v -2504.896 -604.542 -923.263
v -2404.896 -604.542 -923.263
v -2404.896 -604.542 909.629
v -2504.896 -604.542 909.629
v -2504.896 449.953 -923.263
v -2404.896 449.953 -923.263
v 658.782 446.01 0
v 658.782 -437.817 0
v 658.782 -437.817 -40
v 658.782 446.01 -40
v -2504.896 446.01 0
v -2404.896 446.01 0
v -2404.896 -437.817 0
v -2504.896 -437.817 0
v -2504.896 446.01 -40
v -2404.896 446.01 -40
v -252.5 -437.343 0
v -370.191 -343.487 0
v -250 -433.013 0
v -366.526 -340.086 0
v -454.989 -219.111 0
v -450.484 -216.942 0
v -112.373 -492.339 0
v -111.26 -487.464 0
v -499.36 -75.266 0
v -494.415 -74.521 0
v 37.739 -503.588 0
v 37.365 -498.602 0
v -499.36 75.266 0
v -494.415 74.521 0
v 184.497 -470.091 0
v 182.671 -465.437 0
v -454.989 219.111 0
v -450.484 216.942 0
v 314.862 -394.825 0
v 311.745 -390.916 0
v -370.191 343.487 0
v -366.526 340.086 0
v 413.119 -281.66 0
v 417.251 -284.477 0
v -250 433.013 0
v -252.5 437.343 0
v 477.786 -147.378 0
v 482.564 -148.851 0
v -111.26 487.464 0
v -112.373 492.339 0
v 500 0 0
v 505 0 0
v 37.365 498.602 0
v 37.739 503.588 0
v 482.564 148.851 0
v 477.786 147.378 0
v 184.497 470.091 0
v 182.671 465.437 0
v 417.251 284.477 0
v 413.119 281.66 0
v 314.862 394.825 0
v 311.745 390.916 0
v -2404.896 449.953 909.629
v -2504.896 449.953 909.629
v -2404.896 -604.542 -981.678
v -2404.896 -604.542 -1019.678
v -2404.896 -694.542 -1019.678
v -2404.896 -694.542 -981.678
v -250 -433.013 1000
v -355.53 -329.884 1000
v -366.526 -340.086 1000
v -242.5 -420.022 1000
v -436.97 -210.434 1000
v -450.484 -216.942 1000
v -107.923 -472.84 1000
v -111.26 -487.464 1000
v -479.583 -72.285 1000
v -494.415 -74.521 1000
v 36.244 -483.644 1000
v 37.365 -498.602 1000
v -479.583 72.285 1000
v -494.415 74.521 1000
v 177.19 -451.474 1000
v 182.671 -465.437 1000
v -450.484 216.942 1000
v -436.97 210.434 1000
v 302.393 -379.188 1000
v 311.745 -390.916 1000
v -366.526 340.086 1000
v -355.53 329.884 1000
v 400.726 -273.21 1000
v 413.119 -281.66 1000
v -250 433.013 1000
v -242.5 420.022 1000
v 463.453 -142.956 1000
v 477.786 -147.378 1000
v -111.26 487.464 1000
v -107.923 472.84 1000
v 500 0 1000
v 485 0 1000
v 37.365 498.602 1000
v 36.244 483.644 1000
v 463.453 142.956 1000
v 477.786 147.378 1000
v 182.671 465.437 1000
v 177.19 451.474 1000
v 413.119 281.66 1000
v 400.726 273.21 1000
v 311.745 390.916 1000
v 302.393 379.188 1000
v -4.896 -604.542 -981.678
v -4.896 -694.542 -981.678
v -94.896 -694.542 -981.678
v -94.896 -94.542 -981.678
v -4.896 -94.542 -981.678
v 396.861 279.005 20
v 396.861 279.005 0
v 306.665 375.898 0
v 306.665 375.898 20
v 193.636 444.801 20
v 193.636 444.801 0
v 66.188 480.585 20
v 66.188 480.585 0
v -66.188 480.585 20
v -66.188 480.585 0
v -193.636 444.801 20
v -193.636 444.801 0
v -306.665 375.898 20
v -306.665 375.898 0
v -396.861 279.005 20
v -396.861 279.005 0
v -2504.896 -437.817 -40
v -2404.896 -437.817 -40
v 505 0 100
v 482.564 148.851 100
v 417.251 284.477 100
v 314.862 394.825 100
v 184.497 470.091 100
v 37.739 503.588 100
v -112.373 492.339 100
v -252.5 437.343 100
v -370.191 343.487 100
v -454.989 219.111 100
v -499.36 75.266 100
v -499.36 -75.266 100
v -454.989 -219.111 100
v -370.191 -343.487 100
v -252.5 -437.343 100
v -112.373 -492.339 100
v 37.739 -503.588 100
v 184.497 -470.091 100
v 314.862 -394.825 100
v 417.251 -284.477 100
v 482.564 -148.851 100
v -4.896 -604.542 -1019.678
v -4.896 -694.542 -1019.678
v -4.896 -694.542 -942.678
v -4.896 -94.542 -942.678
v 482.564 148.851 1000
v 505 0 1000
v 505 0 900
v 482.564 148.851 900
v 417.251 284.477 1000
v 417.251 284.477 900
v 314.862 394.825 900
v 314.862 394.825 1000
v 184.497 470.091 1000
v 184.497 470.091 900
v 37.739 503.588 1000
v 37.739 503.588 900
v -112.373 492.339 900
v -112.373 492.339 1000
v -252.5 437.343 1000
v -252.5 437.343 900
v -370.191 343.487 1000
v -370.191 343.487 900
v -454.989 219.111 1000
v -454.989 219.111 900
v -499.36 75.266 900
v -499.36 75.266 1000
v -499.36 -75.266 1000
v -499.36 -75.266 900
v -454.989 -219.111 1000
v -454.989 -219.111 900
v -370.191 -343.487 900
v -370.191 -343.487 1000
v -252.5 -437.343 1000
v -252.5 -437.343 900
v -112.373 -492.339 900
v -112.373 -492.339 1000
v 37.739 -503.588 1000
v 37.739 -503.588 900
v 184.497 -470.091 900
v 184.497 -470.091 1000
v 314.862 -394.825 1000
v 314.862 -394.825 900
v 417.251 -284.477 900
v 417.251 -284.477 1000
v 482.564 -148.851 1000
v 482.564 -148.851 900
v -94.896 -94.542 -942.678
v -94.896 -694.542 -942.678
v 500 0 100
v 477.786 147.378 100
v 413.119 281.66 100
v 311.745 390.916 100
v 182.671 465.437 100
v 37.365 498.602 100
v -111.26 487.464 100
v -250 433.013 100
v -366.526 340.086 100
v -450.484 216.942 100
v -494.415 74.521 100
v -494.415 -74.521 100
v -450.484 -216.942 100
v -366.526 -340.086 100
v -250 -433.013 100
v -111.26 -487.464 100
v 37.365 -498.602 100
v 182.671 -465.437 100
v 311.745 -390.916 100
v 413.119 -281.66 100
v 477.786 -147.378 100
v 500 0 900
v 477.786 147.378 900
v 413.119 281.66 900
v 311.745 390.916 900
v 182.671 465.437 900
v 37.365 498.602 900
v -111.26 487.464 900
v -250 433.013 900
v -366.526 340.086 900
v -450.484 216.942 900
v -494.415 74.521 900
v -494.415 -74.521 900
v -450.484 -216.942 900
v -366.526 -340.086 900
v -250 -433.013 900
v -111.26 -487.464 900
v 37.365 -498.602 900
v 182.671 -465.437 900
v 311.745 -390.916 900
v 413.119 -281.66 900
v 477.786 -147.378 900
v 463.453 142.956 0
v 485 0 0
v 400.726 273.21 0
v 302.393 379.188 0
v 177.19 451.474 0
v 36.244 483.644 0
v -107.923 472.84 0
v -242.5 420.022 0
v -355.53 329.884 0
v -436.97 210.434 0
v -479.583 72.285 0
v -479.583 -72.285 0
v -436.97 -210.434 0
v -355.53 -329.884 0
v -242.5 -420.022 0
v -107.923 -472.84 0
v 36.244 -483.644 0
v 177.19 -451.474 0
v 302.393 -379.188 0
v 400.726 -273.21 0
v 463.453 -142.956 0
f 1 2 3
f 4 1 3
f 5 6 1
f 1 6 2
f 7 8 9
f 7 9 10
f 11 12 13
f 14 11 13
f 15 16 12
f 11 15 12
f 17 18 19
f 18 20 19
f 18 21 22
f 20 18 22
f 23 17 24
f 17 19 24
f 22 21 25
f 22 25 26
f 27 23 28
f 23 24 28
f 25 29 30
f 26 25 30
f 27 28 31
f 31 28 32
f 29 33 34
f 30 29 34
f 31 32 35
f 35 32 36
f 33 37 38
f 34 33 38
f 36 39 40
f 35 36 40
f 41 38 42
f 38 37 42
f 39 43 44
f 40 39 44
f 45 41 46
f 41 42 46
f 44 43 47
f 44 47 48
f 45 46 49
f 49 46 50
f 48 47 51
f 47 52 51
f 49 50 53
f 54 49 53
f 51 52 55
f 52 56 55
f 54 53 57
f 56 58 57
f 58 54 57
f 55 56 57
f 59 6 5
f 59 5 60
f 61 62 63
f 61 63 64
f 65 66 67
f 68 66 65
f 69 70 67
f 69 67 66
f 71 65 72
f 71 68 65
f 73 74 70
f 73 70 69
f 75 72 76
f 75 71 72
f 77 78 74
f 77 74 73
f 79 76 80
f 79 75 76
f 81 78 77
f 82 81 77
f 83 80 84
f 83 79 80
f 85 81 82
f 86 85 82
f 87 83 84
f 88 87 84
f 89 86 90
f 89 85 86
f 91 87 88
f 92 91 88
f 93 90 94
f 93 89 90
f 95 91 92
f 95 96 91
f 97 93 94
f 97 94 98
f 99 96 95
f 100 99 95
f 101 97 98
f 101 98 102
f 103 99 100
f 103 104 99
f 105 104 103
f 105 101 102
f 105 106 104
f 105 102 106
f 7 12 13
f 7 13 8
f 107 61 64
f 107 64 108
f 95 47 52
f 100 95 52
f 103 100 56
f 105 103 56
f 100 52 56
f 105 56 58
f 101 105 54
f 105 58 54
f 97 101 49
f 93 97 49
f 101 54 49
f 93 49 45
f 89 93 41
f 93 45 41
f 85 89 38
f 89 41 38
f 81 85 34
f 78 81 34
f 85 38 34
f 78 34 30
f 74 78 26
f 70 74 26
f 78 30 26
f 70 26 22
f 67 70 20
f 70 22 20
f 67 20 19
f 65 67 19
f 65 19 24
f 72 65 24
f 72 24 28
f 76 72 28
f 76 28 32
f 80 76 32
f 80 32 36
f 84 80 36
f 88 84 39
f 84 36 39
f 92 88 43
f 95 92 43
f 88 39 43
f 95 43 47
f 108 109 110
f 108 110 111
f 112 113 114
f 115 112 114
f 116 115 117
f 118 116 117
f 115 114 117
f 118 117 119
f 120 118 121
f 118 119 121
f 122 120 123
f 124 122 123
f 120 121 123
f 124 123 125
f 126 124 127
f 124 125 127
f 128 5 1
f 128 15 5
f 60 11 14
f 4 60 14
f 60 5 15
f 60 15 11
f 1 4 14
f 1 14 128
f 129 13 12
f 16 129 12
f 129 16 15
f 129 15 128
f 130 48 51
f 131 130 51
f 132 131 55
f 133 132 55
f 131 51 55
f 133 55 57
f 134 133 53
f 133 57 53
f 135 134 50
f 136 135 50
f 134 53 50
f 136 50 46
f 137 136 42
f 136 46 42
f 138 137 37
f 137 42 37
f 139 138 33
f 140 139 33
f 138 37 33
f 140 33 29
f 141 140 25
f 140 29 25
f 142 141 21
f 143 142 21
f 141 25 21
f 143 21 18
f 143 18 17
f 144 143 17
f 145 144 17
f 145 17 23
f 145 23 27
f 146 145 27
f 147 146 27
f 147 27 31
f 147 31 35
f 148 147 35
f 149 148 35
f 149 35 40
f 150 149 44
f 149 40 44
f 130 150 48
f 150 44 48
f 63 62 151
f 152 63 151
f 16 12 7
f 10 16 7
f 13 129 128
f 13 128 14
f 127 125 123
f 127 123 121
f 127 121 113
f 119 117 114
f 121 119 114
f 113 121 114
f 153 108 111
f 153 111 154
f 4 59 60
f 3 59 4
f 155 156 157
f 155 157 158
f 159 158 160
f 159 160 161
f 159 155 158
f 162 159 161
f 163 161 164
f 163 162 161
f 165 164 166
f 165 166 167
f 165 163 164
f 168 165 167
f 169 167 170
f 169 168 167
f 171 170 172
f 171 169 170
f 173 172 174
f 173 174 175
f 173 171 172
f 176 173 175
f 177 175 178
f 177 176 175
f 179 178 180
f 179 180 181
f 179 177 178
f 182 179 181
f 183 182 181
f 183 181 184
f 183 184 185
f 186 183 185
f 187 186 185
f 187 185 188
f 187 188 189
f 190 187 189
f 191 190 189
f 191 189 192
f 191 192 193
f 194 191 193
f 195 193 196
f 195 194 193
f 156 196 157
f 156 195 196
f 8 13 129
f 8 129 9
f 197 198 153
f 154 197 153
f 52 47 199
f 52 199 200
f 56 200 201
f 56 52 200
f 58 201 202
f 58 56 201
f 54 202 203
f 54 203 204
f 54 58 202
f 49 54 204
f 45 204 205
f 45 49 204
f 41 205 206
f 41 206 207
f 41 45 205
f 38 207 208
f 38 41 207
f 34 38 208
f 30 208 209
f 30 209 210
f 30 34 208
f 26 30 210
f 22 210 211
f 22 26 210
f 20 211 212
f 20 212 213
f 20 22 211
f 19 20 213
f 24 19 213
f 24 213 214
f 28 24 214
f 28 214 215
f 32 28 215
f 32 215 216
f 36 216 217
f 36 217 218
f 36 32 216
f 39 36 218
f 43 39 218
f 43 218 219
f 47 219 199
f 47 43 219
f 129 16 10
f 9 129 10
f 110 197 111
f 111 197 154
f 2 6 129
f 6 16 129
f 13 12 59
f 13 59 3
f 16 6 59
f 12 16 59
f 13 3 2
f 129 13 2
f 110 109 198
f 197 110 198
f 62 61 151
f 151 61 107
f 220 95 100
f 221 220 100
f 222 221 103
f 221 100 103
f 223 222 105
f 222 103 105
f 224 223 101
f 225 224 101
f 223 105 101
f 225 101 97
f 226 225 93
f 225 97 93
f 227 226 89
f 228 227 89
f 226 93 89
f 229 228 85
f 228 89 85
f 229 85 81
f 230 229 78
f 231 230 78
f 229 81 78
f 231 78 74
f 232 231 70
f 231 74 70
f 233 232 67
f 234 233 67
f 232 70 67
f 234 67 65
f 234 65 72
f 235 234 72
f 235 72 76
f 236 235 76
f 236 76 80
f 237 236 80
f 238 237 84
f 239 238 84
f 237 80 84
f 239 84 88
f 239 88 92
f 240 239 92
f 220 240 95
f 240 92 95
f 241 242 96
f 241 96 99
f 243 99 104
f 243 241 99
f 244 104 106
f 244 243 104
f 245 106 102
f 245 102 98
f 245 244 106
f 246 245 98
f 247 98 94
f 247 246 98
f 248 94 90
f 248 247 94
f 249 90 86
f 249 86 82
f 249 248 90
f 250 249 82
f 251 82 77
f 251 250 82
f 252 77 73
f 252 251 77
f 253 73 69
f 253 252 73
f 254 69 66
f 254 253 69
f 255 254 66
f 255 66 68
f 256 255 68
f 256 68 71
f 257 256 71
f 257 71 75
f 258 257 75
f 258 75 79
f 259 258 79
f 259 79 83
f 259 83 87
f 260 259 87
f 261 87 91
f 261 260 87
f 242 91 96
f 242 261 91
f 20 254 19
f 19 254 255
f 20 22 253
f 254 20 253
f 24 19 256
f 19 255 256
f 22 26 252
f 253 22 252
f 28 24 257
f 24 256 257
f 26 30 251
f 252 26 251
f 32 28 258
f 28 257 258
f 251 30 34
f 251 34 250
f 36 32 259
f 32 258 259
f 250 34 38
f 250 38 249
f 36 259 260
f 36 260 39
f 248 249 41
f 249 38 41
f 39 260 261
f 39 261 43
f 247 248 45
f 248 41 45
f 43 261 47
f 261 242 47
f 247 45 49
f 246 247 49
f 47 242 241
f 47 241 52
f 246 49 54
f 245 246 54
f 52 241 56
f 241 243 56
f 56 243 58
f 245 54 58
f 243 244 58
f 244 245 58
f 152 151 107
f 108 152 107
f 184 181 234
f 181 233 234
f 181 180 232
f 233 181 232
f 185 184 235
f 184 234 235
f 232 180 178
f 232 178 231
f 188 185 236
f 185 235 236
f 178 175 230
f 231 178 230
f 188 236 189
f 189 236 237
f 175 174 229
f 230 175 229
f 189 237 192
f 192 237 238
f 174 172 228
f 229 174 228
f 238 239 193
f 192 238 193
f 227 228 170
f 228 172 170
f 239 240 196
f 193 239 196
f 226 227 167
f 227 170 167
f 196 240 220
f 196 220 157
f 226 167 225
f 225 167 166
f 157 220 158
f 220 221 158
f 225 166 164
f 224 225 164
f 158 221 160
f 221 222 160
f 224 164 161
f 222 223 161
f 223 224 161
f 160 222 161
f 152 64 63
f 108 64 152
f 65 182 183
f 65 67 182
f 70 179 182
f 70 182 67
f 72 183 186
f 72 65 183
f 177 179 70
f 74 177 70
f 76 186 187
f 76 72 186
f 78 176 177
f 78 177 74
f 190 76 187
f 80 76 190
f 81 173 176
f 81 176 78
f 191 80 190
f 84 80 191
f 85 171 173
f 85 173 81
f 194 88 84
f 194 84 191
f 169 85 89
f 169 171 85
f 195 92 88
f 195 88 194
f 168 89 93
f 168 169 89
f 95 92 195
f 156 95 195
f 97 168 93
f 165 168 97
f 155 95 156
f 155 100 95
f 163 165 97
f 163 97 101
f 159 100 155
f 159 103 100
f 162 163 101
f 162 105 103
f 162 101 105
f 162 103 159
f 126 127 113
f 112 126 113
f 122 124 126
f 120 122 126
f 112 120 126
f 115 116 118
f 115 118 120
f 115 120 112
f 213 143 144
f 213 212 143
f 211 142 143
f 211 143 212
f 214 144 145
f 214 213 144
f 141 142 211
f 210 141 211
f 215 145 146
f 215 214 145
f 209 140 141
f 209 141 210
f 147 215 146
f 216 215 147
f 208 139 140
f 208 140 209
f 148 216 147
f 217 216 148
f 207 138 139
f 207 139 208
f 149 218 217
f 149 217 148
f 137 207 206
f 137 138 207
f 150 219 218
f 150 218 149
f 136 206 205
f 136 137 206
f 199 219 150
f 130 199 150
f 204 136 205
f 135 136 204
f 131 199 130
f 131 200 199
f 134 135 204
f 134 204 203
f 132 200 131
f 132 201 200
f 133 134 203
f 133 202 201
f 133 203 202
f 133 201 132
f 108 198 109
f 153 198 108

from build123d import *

# Parameters (mm, degrees)
F1_R      = 500
F1_R_2    = 485
F3_DEPTH  = 1000
F4_R      = 504.9999952316
F4_R_2    = 500
F5_DEPTH  = 100
F6_R      = 504.9999952316
F6_R_2    = 500
F7_DEPTH  = 100
F10_DEPTH = 20
F11_W     = 3063.6771917343
F11_H     = 883.8261663914
F12_DEPTH = 40
F13_W     = 1054.4956624508
F13_H     = 1832.8925967216
F13_W_2   = 883.8261663914
F13_H_2   = 40
F14_DEPTH = 100
F15_W     = 2400
F15_H     = 38
F16_DEPTH = 90
F17_W     = 90
F17_H     = 39
F18_DEPTH = 600


with BuildPart() as f3:
    # F1 (on face) → F3 (new body)
    with BuildSketch(Plane.XY):
        Circle(F1_R)
        Circle(F1_R_2, mode=Mode.SUBTRACT)
    extrude(amount=F3_DEPTH)


with BuildPart() as f5:
    # F4 (on face) → F5 (new body)
    with BuildSketch(Plane.XY.offset(1000)):
        Circle(F4_R)
        Circle(F4_R_2, mode=Mode.SUBTRACT)
    extrude(amount=-F5_DEPTH)


with BuildPart() as f7:
    # F6 (on face) → F7 (new body)
    with BuildSketch(Plane.XY):
        Circle(F6_R)
        Circle(F6_R_2, mode=Mode.SUBTRACT)
    extrude(amount=F7_DEPTH)


with BuildPart() as f10:
    # F9 (on face) → F10 (new body)
    with BuildSketch(Plane.XY):
        with BuildLine():
            Line((-365.7646179199, 279.0051400661), (396.8611955643, 279.0051400661))
            ThreePointArc((396.8611955643, 279.0051400661), (0, 485.1213010455), (-396.8611955643, 279.0051400661))
            Line((-396.8611955643, 279.0051400661), (-365.7646179199, 279.0051400661))
        make_face()
    extrude(amount=F10_DEPTH)


with BuildPart() as f12:
    # F11 (on face) → F12 (new body)
    with BuildSketch(Plane.XY):
        with Locations((-873.056948185, 4.0964633226)):
            Rectangle(F11_W, F11_H)
    extrude(amount=-F12_DEPTH)


with BuildPart() as f14:
    # F13 (on face) → F14 (new body)
    with BuildSketch(Plane(origin=(-2404.8955440521, 0, 0), x_dir=(0, -1, 0), z_dir=(-1, 0, 0))):
        with Locations((77.2945433855, -6.8170130253)):
            Rectangle(F13_W, F13_H)
        with Locations((-4.0964633226, -20)):
            Rectangle(F13_W_2, F13_H_2, mode=Mode.SUBTRACT)
    extrude(amount=F14_DEPTH)


with BuildPart() as f16:
    # F15 (on face) → F16 (new body)
    with BuildSketch(Plane.XZ.offset(604.5423746109)):
        with Locations((-1204.8955440521, -1000.6784378119)):
            Rectangle(F15_W, F15_H)
    extrude(amount=F16_DEPTH)


with BuildPart() as f18:
    # F17 (on face) → F18 (new body)
    with BuildSketch(Plane.XZ.offset(694.5423746109)):
        with Locations((-49.8955440521, -962.1784378119)):
            Rectangle(F17_W, F17_H)
    extrude(amount=-F18_DEPTH)


solid = Compound([f3.part, f5.part, f7.part, f10.part, f12.part, f14.part, f16.part, f18.part])
